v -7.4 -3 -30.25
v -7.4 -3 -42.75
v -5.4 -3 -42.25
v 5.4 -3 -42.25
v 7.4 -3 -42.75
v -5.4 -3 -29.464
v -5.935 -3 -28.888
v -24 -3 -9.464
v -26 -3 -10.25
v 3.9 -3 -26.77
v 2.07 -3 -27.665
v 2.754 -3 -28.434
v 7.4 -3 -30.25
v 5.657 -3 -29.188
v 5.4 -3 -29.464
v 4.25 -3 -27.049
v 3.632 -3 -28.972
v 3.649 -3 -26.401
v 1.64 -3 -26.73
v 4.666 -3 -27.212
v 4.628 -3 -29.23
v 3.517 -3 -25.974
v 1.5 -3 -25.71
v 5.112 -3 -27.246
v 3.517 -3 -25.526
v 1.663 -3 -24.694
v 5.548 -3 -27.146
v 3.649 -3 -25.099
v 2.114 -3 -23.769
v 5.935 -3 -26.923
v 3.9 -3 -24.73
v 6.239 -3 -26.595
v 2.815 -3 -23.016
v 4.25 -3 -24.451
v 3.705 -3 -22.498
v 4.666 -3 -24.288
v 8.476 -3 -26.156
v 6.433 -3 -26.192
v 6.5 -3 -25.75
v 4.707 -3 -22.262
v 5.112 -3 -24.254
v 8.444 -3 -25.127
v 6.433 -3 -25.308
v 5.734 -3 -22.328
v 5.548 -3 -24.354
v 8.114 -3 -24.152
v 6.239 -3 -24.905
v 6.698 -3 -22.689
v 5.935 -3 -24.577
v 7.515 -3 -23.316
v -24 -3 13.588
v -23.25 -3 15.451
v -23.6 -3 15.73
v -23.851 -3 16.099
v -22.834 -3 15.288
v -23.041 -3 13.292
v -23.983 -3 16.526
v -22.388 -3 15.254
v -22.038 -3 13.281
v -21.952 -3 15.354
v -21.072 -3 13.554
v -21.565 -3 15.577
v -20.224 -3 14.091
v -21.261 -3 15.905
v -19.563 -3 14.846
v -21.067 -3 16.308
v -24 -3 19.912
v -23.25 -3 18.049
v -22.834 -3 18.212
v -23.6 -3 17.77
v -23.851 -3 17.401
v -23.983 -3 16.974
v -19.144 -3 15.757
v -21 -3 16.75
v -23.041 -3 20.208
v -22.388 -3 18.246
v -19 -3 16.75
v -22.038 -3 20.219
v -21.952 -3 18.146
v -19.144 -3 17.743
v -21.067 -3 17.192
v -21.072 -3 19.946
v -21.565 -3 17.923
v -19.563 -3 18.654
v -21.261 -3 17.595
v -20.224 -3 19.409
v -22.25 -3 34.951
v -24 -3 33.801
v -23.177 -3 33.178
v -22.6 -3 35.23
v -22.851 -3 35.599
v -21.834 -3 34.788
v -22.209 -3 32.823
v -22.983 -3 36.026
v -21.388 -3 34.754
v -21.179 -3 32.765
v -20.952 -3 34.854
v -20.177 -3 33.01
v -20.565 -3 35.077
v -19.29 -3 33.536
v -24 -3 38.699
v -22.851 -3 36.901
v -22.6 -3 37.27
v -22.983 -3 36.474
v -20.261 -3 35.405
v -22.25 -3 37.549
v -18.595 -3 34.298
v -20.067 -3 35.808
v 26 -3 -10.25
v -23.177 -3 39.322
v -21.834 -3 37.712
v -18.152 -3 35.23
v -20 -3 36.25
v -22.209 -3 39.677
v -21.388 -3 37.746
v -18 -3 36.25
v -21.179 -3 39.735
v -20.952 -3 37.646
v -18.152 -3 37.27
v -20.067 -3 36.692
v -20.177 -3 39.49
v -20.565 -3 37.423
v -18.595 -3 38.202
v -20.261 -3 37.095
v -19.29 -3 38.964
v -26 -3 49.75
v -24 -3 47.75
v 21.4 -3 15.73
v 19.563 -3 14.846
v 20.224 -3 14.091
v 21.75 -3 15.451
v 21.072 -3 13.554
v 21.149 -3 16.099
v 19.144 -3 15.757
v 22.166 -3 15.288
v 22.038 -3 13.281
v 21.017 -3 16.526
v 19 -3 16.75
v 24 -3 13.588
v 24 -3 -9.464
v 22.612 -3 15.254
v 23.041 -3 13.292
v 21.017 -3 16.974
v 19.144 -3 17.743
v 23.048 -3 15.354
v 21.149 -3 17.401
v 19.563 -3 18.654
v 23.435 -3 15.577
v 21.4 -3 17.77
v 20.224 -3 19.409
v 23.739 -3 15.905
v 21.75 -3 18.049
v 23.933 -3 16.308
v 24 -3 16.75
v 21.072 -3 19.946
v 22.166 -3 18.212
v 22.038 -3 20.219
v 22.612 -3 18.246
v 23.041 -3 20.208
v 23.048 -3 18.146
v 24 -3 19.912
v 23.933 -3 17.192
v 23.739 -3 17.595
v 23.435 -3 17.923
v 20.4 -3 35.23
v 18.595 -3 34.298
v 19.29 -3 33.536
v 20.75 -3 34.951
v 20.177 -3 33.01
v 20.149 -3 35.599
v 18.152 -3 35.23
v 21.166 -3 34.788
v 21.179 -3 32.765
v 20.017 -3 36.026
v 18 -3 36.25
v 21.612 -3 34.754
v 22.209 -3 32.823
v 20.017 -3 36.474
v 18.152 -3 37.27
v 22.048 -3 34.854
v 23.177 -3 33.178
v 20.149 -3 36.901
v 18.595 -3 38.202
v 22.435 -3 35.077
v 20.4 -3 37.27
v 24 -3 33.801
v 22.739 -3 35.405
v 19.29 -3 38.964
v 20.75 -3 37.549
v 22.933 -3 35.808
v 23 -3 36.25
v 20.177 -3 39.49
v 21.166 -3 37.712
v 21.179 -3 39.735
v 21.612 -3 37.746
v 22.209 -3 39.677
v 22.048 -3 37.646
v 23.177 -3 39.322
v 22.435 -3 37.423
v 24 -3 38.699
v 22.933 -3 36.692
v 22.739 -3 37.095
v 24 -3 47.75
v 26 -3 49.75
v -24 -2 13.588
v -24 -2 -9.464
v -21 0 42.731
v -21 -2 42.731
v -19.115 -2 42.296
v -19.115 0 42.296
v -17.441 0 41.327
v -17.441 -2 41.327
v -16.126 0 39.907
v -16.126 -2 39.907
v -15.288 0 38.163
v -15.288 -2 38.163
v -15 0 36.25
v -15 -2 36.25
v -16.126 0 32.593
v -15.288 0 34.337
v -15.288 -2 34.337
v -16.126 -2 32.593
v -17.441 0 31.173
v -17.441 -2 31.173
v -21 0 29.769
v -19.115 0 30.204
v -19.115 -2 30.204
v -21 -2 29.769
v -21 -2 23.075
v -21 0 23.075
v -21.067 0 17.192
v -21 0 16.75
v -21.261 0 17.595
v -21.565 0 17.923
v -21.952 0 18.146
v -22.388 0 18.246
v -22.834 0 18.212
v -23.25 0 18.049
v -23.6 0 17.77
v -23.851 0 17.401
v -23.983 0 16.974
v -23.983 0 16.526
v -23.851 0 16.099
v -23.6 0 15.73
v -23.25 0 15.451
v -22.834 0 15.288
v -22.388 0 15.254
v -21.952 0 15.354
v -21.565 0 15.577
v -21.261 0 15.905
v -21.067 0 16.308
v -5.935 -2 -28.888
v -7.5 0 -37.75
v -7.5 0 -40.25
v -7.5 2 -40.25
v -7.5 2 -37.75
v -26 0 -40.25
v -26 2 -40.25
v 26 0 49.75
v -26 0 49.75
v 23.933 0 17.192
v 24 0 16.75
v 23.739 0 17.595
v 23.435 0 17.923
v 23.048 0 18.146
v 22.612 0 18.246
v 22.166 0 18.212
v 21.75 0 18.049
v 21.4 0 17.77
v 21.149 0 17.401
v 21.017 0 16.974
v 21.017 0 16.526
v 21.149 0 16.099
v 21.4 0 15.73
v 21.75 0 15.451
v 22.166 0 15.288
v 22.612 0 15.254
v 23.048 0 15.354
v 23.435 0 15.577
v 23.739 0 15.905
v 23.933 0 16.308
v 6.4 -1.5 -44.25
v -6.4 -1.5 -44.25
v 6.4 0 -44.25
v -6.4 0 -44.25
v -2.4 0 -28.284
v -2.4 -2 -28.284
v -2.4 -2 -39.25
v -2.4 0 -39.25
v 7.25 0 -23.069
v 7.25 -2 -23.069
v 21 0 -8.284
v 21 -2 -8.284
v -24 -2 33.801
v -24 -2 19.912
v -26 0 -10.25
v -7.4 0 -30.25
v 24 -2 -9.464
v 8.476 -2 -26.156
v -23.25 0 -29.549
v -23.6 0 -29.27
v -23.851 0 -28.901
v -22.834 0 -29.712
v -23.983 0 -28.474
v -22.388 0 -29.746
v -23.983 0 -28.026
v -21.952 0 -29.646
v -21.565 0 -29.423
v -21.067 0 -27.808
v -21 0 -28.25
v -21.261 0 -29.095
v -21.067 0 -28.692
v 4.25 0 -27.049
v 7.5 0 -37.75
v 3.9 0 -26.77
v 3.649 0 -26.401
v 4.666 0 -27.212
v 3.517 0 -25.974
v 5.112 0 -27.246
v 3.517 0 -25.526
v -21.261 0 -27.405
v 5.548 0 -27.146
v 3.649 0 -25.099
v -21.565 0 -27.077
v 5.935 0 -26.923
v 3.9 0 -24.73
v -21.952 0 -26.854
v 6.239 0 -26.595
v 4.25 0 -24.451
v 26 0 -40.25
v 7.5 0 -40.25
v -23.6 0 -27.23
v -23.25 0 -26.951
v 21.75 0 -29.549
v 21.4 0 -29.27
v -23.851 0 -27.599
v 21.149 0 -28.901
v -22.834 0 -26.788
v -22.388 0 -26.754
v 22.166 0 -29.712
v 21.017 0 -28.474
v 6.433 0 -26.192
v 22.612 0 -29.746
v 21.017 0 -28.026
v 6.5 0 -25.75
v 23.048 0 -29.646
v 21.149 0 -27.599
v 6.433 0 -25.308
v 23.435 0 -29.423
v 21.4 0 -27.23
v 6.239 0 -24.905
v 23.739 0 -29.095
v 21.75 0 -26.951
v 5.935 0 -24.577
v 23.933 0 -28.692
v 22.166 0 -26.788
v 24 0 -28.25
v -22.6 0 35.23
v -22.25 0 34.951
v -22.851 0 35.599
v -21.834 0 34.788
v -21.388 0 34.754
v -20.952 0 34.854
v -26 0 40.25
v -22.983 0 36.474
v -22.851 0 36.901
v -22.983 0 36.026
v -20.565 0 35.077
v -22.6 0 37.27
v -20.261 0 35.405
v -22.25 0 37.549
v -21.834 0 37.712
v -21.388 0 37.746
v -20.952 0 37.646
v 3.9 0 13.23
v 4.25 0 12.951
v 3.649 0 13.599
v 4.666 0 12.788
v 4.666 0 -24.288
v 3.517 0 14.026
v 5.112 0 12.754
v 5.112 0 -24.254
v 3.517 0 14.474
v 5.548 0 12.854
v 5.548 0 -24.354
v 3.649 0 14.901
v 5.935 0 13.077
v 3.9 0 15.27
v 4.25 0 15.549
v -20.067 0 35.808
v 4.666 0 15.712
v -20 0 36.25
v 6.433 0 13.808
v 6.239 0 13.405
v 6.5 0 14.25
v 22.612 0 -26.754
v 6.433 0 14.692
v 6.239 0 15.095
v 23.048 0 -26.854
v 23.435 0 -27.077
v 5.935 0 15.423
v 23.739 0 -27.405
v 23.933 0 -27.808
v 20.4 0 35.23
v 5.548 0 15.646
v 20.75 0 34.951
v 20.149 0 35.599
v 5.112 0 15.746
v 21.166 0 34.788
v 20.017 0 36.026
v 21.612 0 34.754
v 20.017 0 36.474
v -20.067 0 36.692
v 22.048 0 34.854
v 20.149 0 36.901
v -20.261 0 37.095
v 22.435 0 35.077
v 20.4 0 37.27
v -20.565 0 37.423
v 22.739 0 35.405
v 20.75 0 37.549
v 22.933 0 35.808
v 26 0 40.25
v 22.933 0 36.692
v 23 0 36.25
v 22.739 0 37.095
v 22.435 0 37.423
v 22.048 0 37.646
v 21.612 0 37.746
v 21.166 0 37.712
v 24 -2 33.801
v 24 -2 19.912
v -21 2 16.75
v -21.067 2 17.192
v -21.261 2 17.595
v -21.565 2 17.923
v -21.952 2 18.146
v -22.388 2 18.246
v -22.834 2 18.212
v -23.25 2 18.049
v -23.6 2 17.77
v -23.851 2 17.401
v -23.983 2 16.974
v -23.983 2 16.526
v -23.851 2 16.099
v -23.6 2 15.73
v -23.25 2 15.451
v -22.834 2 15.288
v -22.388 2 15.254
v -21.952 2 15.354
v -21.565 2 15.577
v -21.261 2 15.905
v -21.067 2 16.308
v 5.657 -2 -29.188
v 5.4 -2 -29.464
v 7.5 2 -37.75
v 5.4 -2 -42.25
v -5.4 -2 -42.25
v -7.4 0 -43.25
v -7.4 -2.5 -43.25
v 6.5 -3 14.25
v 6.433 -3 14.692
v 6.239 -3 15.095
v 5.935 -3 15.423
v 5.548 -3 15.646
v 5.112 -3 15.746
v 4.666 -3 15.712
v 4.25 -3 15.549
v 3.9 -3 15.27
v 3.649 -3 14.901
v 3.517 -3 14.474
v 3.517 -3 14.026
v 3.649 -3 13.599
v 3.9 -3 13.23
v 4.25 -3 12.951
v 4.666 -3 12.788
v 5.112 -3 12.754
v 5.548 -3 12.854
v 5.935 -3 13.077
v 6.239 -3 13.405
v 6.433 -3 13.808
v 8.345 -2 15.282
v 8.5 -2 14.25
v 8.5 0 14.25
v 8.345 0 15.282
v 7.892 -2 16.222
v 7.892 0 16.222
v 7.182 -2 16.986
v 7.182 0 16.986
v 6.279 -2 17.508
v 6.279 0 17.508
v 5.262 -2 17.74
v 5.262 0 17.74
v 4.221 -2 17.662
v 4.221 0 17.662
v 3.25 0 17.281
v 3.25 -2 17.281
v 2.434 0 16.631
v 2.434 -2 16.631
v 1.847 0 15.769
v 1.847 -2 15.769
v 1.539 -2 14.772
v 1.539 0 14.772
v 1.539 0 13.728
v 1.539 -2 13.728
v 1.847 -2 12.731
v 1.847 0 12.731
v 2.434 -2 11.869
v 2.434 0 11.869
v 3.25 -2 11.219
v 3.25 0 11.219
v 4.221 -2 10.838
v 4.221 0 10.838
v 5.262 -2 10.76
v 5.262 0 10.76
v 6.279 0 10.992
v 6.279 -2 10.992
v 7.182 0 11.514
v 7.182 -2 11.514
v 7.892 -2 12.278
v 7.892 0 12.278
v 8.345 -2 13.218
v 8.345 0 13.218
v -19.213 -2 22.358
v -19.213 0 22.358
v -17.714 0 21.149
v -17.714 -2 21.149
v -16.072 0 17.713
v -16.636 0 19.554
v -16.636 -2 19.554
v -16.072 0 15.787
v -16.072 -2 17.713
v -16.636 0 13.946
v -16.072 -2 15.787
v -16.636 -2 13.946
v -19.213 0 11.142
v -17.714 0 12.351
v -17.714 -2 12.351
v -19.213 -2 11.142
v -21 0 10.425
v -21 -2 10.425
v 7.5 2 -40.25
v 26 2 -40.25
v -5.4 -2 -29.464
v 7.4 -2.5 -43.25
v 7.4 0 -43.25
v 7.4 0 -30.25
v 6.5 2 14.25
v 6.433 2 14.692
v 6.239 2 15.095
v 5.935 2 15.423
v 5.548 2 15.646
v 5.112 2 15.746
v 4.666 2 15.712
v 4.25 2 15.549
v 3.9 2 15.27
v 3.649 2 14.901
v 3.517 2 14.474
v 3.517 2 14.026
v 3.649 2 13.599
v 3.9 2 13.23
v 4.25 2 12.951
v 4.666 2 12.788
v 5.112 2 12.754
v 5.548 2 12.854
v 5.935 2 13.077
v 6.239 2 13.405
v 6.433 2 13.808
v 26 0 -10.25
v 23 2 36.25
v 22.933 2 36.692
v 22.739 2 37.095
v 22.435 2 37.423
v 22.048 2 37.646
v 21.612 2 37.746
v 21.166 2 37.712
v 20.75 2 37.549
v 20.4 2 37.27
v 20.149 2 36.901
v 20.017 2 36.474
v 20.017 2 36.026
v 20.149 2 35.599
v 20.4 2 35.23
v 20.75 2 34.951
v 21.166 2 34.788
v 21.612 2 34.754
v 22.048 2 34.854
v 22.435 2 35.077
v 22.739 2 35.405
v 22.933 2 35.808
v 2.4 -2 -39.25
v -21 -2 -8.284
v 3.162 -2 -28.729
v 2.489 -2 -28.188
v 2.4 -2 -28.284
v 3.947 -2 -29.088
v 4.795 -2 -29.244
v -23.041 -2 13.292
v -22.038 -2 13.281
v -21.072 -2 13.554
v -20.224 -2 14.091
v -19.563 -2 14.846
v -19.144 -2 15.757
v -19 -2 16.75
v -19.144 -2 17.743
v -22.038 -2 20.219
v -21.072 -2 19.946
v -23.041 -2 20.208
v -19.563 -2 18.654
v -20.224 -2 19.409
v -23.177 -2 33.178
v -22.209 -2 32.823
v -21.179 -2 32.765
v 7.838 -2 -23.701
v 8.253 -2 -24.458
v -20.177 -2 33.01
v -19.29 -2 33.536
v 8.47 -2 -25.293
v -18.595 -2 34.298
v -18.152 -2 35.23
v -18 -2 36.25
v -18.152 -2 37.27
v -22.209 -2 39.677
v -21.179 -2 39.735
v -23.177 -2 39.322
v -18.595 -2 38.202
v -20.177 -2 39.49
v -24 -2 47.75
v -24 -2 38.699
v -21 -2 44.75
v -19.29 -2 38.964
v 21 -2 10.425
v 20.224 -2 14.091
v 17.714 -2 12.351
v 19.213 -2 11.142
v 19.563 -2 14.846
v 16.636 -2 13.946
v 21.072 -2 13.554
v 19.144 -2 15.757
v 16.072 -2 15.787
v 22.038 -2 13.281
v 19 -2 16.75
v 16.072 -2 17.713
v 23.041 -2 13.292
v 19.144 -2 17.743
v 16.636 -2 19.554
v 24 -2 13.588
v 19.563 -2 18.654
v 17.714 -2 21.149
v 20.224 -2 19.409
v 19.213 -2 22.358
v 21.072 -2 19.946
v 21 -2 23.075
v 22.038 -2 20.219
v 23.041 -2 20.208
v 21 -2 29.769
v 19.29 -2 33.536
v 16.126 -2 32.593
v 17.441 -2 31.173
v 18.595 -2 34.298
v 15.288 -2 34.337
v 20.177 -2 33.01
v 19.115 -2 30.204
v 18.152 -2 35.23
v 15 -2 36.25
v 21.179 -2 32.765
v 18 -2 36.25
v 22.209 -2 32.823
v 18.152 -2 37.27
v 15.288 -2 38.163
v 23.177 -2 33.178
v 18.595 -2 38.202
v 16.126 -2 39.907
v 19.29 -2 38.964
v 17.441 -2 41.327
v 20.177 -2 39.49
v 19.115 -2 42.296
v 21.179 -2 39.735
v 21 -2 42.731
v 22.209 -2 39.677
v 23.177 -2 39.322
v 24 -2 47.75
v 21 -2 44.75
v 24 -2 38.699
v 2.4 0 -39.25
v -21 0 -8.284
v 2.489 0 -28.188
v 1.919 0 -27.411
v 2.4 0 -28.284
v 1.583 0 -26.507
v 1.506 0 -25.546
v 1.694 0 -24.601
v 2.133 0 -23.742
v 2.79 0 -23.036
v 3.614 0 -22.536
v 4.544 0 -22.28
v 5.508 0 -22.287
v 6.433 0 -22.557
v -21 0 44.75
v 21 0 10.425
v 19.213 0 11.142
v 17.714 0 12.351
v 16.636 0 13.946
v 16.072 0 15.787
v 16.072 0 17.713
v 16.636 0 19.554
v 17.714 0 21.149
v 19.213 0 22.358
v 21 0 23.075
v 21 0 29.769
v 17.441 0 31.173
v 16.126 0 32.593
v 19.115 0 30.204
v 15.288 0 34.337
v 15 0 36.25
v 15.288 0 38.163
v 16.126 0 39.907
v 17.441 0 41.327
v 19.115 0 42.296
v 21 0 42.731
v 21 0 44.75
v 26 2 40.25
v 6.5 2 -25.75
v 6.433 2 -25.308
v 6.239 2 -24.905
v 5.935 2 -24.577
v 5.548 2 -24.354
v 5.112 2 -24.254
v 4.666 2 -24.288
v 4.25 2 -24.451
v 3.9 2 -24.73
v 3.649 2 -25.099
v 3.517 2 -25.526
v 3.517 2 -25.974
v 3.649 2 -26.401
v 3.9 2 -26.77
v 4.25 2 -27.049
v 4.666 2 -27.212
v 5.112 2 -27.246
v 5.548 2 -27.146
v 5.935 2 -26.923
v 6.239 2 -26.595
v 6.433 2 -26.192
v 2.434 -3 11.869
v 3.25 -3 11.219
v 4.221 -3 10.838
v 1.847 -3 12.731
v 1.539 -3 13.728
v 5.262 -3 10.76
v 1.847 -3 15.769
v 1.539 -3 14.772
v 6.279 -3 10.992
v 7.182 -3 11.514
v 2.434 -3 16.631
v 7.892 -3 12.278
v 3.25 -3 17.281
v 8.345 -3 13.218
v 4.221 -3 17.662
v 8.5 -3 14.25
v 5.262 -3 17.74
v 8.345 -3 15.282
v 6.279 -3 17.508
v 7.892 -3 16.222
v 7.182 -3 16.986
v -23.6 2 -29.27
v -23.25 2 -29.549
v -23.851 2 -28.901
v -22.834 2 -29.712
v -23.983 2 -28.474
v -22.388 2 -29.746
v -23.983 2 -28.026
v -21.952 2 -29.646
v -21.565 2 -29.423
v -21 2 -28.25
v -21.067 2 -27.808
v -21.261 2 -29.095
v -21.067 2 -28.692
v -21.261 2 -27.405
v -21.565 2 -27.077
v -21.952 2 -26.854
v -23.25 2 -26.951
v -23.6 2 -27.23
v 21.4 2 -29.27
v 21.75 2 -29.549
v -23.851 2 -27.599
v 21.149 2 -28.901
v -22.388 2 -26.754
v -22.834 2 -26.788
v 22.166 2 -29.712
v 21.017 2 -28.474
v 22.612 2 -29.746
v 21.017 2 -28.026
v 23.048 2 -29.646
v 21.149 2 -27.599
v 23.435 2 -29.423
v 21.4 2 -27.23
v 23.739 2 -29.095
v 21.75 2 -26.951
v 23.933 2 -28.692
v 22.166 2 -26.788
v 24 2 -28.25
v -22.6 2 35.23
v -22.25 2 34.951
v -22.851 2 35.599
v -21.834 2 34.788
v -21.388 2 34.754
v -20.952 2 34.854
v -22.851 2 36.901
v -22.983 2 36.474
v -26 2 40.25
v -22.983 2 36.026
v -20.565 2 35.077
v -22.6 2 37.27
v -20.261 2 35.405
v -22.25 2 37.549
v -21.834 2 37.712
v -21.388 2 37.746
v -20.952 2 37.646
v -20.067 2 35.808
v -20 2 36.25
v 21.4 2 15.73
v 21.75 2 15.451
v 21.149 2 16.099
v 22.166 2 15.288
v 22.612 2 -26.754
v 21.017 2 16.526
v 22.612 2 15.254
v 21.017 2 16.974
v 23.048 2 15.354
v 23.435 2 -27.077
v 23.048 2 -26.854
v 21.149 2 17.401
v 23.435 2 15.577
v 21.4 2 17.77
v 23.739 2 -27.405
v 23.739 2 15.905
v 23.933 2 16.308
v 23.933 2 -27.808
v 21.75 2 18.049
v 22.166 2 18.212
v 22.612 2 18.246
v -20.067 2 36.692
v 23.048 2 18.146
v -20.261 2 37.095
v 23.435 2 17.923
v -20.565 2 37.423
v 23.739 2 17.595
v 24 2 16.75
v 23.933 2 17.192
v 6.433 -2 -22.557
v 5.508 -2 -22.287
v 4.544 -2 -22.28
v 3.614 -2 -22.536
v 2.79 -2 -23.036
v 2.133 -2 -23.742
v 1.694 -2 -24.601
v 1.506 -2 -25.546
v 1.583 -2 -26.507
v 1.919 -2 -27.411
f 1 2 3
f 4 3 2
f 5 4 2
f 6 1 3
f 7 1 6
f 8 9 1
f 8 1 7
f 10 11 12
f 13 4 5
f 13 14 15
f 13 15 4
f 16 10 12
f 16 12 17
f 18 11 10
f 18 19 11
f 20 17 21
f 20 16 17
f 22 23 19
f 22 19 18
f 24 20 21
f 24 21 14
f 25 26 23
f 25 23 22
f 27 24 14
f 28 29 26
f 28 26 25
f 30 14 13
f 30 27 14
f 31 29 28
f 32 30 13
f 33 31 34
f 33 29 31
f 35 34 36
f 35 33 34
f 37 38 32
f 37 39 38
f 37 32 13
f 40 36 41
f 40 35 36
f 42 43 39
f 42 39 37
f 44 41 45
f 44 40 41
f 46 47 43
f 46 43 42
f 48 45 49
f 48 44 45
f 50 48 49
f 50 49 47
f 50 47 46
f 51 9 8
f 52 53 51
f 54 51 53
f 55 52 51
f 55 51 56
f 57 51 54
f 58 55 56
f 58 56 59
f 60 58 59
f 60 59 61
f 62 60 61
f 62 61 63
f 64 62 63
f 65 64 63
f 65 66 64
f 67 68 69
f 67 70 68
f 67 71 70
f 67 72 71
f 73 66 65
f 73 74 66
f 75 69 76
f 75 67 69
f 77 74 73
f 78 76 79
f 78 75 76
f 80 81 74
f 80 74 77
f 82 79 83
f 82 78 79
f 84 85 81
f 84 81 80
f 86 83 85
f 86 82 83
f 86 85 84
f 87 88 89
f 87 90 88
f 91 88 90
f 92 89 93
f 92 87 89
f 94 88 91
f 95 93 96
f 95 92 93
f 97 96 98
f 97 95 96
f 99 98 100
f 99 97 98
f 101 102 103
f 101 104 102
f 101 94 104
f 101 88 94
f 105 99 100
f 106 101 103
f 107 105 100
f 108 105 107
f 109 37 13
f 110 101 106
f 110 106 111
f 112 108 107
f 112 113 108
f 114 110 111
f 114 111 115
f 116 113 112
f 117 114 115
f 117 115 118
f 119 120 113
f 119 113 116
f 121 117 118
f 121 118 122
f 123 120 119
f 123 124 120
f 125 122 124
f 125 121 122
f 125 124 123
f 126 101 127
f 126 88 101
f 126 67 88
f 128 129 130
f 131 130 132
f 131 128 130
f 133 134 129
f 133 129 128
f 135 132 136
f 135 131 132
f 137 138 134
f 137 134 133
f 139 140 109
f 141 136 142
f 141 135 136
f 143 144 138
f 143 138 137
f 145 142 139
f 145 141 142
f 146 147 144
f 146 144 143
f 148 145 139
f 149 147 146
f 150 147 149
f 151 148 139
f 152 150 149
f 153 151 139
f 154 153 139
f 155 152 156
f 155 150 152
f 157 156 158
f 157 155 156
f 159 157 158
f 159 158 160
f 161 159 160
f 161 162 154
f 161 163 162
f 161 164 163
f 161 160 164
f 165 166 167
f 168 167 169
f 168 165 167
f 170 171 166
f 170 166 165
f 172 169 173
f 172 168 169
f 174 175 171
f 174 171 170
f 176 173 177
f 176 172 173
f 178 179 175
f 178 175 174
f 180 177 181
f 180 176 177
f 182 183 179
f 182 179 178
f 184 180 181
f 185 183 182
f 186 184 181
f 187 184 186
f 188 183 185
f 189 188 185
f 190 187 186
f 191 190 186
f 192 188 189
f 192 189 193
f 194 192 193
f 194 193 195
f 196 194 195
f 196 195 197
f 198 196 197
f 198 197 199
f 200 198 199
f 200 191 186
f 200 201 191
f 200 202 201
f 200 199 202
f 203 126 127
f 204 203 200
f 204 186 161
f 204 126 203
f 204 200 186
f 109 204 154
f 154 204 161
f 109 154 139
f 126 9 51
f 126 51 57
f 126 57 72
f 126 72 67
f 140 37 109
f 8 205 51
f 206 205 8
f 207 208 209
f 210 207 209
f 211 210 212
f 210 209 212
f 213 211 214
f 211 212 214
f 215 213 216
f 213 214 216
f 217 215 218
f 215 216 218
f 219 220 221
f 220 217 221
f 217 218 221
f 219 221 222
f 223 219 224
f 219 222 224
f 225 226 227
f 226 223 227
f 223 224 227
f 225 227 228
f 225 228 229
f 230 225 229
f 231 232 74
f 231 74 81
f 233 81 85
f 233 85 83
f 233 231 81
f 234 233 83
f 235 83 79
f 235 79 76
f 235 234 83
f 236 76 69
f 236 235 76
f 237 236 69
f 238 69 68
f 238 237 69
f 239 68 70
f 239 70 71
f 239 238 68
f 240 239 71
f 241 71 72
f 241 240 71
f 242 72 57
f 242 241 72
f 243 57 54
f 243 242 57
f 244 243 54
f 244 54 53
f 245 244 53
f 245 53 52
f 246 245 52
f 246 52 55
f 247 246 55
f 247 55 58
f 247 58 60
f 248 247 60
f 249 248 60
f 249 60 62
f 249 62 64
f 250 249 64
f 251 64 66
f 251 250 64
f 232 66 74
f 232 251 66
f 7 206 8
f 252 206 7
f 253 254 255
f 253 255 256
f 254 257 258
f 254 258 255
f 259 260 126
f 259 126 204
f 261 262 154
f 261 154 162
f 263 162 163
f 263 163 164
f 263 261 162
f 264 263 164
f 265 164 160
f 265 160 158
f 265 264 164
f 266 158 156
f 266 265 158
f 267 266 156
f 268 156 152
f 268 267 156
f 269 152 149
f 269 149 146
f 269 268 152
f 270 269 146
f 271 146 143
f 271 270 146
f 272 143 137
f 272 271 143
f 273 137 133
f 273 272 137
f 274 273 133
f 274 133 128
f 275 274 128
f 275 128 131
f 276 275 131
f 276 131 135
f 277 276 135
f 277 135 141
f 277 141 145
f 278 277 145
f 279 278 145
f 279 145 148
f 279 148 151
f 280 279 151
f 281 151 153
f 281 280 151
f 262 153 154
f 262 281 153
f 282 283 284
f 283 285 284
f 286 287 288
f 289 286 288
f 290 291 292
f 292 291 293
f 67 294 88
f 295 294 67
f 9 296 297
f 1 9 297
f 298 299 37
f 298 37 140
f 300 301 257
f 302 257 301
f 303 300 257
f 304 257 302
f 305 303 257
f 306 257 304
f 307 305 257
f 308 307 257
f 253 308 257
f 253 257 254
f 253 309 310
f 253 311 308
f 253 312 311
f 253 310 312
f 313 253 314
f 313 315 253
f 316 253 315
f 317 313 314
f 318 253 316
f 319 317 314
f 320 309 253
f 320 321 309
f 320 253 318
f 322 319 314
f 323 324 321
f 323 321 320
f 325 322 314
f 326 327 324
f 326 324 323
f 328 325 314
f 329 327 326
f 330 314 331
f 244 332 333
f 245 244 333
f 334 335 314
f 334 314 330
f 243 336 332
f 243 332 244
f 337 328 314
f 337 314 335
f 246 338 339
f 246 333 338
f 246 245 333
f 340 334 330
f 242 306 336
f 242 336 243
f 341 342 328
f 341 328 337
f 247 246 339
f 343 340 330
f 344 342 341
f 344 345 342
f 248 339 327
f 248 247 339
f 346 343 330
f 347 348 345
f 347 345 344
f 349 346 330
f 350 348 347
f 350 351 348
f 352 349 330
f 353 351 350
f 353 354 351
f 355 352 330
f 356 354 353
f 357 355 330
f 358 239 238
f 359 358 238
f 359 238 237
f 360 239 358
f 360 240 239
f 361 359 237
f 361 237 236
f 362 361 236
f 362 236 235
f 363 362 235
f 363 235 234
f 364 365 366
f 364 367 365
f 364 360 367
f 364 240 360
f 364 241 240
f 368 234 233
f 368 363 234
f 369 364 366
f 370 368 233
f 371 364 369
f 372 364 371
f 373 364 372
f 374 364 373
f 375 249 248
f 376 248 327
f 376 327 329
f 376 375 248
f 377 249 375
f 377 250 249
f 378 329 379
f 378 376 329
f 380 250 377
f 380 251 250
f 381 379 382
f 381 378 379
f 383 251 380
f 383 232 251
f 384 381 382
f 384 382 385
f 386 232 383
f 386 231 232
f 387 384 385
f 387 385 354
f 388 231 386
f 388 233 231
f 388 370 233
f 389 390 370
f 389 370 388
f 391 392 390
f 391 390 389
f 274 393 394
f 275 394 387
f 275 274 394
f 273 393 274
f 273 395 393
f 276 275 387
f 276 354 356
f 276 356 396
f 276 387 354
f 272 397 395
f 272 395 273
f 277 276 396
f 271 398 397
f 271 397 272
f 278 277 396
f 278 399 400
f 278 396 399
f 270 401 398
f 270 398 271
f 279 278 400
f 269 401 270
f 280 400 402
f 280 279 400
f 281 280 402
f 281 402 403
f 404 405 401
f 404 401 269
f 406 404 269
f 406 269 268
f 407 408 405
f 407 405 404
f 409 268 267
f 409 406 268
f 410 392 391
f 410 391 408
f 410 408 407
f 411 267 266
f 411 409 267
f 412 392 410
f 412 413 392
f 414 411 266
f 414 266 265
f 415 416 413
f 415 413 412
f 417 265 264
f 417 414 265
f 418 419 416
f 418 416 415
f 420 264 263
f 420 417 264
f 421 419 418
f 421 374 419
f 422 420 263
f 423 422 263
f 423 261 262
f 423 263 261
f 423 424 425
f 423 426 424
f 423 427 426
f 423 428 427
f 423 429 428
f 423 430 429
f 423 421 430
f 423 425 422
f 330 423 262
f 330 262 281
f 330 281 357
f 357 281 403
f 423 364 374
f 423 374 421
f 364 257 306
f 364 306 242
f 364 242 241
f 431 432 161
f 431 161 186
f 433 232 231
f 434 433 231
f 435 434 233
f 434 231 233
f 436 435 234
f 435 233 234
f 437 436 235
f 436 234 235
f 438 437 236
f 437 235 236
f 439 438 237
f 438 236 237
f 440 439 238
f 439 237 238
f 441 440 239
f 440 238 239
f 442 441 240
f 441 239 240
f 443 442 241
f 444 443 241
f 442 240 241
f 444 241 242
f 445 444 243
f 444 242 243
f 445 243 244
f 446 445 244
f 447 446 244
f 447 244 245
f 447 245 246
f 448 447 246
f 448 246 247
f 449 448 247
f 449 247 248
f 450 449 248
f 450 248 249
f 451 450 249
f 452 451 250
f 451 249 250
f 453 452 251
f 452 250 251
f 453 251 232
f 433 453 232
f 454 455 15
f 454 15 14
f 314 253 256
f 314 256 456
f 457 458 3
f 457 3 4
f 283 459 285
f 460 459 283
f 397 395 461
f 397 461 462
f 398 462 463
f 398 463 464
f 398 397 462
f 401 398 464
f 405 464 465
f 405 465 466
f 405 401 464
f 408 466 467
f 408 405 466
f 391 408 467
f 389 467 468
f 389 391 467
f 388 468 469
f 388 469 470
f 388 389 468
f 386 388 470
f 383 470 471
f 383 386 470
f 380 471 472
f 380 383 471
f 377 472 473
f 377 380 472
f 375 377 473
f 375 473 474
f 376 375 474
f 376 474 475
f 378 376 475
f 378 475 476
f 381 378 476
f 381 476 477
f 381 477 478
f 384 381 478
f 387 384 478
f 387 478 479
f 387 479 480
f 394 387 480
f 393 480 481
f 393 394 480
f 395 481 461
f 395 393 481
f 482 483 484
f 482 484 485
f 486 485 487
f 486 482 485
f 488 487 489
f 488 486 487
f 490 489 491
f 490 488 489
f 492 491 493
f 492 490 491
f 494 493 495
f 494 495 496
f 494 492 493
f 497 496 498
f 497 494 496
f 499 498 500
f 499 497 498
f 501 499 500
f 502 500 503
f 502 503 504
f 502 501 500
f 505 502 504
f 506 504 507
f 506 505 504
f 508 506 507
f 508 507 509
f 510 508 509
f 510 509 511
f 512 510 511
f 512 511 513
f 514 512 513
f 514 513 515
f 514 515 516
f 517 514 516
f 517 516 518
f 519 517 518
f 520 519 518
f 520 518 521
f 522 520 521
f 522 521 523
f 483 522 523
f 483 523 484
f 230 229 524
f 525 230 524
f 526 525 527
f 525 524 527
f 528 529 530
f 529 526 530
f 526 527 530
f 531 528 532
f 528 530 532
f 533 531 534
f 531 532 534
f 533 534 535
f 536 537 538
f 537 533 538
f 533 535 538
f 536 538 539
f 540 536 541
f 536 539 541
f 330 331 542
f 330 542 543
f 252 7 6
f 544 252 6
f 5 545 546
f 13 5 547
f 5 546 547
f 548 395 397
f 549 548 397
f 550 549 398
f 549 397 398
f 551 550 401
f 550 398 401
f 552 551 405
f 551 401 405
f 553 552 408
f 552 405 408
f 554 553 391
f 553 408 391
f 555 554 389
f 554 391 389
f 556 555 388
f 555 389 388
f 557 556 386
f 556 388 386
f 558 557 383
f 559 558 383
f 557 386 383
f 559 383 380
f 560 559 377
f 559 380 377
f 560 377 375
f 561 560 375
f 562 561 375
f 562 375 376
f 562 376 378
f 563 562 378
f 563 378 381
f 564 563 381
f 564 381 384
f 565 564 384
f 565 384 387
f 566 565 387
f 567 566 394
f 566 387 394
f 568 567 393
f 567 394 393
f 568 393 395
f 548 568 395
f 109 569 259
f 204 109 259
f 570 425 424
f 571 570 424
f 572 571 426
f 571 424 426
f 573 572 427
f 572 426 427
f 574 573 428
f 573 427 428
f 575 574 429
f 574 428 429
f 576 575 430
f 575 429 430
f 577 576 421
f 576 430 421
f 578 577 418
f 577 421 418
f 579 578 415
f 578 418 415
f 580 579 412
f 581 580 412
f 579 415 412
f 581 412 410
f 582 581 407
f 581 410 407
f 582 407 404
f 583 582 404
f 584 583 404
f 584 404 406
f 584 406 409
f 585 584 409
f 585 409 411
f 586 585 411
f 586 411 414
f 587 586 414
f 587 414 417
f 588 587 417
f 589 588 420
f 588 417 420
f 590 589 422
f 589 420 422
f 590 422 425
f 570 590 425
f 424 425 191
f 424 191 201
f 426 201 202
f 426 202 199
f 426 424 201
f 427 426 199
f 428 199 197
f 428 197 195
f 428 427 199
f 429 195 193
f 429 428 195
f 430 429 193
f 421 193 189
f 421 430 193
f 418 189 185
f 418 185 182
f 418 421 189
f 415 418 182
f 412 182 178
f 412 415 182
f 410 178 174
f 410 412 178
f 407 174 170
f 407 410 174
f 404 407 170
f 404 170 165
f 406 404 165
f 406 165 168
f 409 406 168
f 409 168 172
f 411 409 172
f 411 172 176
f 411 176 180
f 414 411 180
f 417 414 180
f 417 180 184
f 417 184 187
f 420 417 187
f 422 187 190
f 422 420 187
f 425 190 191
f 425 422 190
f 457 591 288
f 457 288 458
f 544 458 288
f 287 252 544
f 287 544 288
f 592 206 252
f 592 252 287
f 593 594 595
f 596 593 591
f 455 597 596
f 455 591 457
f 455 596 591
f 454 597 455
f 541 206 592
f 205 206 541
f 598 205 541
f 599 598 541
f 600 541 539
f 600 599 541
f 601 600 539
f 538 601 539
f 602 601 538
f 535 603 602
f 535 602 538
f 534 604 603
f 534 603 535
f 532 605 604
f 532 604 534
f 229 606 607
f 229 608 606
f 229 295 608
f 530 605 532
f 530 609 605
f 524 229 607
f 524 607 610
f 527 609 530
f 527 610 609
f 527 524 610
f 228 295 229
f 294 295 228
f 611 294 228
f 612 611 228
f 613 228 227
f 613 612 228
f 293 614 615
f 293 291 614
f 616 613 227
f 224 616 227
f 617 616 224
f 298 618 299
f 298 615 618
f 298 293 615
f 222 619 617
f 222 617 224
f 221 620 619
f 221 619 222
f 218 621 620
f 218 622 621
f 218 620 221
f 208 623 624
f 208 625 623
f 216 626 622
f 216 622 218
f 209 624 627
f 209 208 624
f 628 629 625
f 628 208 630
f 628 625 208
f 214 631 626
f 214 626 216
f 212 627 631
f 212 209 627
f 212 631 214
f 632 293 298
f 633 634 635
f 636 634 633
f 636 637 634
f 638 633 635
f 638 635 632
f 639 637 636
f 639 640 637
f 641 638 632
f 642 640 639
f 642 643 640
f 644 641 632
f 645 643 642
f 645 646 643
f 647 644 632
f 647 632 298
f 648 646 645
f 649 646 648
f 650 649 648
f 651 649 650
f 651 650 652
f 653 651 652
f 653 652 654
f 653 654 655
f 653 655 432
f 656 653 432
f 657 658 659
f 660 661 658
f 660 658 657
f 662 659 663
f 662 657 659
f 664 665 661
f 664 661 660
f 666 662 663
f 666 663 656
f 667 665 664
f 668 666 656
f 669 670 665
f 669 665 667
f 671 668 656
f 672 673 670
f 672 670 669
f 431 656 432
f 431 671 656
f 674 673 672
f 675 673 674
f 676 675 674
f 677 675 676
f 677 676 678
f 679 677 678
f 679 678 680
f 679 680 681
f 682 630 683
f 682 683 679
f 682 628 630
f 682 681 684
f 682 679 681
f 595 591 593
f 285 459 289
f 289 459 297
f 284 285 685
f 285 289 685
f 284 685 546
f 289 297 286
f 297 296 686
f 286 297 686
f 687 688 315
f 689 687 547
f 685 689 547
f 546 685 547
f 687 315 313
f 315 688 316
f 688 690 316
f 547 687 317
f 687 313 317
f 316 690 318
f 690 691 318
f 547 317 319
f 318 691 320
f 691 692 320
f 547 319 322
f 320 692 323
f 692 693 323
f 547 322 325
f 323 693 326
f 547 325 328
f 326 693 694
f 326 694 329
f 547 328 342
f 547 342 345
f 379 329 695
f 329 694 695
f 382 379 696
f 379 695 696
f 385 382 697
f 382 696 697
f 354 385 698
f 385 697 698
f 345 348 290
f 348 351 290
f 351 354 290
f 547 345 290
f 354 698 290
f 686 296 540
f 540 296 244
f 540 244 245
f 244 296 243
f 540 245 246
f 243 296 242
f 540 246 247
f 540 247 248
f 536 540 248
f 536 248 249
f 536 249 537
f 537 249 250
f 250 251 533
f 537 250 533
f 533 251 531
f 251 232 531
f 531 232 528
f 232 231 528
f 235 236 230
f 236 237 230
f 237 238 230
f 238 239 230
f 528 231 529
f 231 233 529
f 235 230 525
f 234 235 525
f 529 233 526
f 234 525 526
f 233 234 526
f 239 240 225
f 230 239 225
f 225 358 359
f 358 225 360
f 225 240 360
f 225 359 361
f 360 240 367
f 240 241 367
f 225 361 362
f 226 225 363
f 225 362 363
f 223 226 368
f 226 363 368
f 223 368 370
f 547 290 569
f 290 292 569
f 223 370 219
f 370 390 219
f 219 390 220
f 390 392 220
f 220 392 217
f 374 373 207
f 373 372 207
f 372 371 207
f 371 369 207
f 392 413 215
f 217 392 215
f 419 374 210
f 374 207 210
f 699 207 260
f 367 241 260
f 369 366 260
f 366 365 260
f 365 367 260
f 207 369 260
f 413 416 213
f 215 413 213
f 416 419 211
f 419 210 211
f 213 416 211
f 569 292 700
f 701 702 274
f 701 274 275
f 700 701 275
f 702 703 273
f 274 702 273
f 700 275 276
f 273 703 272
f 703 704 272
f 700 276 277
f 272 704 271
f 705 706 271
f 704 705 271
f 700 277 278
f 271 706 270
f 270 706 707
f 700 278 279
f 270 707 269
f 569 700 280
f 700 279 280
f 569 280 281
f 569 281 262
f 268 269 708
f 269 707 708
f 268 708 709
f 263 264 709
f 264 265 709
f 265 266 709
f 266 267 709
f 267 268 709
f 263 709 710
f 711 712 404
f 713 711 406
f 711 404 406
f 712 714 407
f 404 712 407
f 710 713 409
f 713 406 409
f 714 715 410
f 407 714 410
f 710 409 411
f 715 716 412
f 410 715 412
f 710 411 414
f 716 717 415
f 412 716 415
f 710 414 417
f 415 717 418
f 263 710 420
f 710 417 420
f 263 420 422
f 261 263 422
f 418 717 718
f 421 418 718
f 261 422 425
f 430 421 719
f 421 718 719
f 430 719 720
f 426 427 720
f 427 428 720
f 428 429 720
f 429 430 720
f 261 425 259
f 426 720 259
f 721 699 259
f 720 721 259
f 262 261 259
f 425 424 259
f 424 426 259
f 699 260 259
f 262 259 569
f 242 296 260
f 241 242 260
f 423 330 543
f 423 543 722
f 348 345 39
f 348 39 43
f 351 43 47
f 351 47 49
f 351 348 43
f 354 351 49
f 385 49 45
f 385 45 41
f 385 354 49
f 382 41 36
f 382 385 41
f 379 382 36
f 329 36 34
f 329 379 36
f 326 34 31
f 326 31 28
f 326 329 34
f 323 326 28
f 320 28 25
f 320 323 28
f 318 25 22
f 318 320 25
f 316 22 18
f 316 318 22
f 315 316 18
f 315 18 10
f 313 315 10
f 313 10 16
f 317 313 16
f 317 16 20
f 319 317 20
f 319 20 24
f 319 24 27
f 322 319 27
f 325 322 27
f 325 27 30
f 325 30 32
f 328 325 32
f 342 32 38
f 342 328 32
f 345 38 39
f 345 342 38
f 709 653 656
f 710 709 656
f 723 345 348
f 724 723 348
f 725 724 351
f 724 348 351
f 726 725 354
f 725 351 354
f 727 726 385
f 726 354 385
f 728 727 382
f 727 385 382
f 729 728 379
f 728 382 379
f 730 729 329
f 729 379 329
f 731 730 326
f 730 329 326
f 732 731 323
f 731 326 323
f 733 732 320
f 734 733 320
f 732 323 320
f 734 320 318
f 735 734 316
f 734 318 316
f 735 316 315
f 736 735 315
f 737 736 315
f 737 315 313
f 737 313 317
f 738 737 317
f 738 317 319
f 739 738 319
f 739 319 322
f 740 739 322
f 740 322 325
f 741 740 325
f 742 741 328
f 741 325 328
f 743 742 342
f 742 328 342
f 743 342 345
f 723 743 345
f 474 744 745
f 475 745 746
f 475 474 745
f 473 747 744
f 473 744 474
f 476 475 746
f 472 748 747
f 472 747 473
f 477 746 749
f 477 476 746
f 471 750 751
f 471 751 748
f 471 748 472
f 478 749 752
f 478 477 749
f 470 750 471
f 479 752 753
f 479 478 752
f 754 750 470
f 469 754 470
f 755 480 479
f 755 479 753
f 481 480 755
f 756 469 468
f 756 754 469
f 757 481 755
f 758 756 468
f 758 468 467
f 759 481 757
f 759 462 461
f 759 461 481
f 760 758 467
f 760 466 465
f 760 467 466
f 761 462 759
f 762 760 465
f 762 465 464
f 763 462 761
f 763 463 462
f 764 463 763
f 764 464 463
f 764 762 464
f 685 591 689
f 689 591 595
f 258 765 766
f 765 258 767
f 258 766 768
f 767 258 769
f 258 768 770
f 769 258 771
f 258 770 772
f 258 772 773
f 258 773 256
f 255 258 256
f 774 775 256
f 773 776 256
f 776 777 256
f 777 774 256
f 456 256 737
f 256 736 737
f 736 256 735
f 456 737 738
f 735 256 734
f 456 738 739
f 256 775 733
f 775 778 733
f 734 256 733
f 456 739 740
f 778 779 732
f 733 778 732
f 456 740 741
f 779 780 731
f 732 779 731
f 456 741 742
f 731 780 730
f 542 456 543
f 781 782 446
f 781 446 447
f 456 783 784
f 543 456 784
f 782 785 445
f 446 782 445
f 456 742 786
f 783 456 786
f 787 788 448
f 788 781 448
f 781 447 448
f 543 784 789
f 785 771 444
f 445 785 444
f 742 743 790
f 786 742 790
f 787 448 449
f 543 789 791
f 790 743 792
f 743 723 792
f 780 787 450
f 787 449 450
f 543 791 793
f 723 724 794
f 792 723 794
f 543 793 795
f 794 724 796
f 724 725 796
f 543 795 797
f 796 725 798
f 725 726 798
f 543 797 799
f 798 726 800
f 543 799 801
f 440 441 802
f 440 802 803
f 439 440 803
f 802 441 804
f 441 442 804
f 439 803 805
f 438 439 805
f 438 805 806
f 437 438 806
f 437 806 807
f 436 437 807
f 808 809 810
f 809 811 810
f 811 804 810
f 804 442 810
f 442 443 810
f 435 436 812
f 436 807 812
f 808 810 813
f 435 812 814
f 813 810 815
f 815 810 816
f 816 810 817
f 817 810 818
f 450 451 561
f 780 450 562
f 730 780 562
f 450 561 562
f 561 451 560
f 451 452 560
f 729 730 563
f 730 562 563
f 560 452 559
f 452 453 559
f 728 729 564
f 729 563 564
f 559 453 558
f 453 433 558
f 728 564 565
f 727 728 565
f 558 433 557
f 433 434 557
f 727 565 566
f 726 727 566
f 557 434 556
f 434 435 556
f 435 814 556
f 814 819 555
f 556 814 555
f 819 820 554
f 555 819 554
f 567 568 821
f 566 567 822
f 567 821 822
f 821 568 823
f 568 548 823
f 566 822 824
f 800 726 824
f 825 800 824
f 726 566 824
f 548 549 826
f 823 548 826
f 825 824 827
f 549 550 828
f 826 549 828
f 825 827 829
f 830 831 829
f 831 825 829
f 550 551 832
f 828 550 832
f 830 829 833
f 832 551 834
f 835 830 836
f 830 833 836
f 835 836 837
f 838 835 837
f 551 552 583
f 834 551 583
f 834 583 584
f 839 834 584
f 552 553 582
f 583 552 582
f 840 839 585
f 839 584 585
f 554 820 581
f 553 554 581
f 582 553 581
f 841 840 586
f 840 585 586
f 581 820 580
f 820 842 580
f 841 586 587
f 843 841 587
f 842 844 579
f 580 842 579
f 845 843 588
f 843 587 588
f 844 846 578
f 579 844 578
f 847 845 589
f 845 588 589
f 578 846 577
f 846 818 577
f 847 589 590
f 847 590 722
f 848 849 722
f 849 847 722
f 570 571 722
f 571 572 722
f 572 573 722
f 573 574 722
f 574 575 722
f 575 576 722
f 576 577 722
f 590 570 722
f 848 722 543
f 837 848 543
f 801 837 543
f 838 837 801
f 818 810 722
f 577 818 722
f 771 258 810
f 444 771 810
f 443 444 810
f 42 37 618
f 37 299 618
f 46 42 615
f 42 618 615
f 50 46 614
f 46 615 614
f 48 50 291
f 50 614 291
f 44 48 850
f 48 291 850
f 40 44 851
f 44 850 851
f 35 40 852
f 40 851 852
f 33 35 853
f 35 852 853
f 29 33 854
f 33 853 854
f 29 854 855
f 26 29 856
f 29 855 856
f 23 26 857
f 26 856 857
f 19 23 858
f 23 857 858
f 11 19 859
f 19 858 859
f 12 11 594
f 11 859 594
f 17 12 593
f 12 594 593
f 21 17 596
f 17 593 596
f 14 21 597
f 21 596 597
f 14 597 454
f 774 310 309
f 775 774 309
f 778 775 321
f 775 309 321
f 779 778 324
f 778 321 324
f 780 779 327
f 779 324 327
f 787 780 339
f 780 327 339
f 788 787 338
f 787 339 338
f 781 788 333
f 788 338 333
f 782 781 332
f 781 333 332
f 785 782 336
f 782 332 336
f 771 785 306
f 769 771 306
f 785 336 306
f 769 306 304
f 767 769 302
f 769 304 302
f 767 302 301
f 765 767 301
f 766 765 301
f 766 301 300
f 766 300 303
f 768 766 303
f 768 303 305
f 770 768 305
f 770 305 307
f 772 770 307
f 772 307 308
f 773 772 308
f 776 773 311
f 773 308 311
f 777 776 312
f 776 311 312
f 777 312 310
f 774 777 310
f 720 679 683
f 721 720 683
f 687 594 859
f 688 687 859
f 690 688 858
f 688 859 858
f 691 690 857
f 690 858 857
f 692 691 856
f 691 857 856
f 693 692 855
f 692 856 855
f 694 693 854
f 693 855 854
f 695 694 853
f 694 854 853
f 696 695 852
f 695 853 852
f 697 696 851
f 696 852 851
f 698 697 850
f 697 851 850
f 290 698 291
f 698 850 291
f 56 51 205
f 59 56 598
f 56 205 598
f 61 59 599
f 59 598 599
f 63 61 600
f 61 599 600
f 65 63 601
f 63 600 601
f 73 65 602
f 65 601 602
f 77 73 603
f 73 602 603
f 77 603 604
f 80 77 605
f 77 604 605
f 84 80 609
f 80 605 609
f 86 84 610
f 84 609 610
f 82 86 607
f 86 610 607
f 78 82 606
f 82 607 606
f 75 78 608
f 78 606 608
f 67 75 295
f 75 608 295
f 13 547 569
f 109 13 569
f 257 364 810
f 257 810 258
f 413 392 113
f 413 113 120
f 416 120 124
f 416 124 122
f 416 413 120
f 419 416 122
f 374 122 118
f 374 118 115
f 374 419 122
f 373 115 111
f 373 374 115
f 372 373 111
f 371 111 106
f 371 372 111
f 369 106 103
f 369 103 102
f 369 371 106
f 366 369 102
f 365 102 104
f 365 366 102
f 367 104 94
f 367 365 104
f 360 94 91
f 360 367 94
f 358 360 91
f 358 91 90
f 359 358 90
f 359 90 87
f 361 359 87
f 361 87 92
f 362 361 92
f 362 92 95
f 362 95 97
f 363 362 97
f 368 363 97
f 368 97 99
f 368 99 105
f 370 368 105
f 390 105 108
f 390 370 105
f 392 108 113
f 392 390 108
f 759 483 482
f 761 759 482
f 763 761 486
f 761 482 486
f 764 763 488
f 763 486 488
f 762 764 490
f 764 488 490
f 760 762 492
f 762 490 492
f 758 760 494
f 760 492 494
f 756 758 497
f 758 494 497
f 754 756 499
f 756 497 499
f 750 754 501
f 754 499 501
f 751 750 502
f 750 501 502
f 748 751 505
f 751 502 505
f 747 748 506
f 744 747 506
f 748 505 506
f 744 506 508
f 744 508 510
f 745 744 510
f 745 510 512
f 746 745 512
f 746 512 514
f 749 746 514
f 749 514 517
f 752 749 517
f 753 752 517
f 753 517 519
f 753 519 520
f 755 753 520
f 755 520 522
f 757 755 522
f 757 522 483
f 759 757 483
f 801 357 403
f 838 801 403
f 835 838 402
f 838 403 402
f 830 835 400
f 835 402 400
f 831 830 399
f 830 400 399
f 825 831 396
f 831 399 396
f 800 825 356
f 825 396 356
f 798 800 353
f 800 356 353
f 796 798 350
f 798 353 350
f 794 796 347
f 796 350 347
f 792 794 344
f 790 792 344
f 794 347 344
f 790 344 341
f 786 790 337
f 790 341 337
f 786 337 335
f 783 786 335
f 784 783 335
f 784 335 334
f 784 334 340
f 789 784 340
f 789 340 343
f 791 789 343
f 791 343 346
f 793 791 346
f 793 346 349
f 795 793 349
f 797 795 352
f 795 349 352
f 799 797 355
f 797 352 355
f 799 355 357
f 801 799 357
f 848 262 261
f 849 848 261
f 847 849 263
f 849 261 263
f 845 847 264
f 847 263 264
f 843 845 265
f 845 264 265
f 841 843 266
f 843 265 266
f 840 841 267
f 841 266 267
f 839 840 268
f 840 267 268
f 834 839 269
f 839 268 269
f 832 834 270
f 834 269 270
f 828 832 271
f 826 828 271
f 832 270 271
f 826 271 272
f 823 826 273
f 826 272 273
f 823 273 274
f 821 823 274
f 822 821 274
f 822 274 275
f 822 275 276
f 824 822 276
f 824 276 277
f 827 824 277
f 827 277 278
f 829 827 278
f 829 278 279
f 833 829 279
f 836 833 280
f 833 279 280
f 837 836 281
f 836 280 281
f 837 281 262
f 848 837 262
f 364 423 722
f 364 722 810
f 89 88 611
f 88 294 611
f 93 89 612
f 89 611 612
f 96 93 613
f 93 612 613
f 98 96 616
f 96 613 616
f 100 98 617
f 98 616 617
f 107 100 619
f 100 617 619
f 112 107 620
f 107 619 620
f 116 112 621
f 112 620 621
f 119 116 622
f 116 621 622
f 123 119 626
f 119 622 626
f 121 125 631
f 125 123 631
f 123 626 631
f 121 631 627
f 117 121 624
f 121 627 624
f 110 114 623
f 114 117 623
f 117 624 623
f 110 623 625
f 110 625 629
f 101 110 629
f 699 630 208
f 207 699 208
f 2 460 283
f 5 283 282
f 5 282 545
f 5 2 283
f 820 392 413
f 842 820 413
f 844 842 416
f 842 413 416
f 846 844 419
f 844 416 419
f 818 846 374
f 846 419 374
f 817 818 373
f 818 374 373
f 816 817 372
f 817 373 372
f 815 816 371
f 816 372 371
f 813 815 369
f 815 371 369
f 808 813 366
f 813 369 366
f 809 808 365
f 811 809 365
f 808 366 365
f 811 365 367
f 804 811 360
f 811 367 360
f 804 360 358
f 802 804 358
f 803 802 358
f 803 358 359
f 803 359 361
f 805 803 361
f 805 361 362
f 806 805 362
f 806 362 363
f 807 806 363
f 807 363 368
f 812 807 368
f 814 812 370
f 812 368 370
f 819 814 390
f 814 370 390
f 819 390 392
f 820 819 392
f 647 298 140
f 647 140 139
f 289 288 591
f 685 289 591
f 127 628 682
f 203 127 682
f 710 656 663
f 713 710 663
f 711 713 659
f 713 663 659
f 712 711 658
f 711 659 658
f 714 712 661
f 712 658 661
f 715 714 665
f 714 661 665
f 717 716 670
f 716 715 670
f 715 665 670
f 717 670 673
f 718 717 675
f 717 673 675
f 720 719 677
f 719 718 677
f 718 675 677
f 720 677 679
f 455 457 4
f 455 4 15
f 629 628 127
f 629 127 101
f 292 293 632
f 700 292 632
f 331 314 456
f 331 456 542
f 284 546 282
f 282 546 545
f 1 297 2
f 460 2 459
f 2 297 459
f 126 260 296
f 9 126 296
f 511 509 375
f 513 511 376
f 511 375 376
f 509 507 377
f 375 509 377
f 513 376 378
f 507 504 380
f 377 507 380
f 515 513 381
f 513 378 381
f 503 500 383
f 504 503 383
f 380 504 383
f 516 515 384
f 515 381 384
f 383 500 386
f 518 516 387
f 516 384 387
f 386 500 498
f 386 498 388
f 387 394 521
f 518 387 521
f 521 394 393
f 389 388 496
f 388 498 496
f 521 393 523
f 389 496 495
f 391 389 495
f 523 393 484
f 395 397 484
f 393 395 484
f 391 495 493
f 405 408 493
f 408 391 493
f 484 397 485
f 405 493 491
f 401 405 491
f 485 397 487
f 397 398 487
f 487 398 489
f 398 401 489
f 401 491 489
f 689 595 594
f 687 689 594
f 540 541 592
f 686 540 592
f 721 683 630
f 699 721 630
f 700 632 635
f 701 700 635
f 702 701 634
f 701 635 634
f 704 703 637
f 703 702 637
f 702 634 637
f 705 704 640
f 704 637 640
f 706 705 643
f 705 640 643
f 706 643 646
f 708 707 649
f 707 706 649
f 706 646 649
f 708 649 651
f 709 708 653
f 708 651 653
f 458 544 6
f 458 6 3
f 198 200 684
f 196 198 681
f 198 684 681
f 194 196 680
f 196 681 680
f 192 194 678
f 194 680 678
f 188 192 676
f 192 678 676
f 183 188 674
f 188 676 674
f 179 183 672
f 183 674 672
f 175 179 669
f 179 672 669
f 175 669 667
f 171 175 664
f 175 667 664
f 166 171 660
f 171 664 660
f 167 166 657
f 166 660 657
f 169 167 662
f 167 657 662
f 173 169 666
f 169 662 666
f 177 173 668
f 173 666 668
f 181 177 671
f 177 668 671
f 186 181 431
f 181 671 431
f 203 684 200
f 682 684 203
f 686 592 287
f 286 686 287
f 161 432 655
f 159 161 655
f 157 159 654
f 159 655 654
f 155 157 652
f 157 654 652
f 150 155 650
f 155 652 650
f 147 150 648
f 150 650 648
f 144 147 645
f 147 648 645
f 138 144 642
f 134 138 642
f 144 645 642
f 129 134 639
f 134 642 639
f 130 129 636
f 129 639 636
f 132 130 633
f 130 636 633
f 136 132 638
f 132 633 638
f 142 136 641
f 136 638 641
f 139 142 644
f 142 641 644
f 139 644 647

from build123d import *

# Parameters (mm, degrees)
F0_R        = 1.5
F1_DEPTH    = 2
F2_W        = 52
F2_H        = 9.5
F2_R        = 1.5
F2_W_2      = 14.8
F2_H_2      = 2.5
F3_DEPTH    = 3
F4_T        = 2
F4_T3_DEPTH = 7
F5_SIZE     = 1.5
F6_SIZE     = 1
F7_R        = 3.5
F8_DEPTH    = 25


# Not quite as in the source:
# - a shell that OpenCascade refuses in one call is made with other operations: the cavity is built on its own and cut out


with BuildPart() as f1:
    # F0 (on Front) → F1 (new body)
    with BuildSketch(Plane.XZ):
        Polygon((26, -40.25), (26, 40.25), (-26, 40.25), (-26, -40.25), (-7.5, -40.25), (-7.5, -37.75), (7.5, -37.75), (7.5, -40.25), align=None)
        with Locations((-22.5, -28.25)):
            Circle(F0_R, mode=Mode.SUBTRACT)
        with Locations((5, -25.75)):
            Circle(F0_R, mode=Mode.SUBTRACT)
        with Locations((22.5, -28.25)):
            Circle(F0_R, mode=Mode.SUBTRACT)
        with Locations((-22.5, 16.75)):
            Circle(F0_R, mode=Mode.SUBTRACT)
        with Locations((-21.5, 36.25)):
            Circle(F0_R, mode=Mode.SUBTRACT)
        with Locations((5, 14.25)):
            Circle(F0_R, mode=Mode.SUBTRACT)
        with Locations((22.5, 16.75)):
            Circle(F0_R, mode=Mode.SUBTRACT)
        with Locations((21.5, 36.25)):
            Circle(F0_R, mode=Mode.SUBTRACT)
    extrude(amount=-F1_DEPTH)


with BuildPart() as f3:
    # F2 (on face) → F3 (new body)
    with BuildSketch(Plane.XZ):
        Polygon((7.4, -40.25), (-7.4, -40.25), (-7.4, -44.25), (0, -44.25), (7.4, -44.25), align=None)
        with Locations((0, 45)):
            Rectangle(F2_W, F2_H)
        Polygon((-26, 40.25), (-26, -10.25), (-7.4, -30.25), (-7.4, -37.75), (7.4, -37.75), (7.4, -30.25), (26, -10.25), (26, 40.25), align=None)
        with Locations((5, -25.75)):
            Circle(F2_R, mode=Mode.SUBTRACT)
        with Locations((-22.5, 16.75)):
            Circle(F2_R, mode=Mode.SUBTRACT)
        with Locations((-21.5, 36.25)):
            Circle(F2_R, mode=Mode.SUBTRACT)
        with Locations((5, 14.25)):
            Circle(F2_R, mode=Mode.SUBTRACT)
        with Locations((22.5, 16.75)):
            Circle(F2_R, mode=Mode.SUBTRACT)
        with Locations((21.5, 36.25)):
            Circle(F2_R, mode=Mode.SUBTRACT)
        with Locations((0, -39)):
            Rectangle(F2_W_2, F2_H_2)
    extrude(amount=F3_DEPTH)

    # F4: shell of thickness 2, made by hand


with BuildPart() as f4_core1:
    # F4_t2: copy of F3
    add(f3.part)

    # the walls: a layer under each face that stays
    f4_faces = [f4_core1.faces().sort_by_distance(p)[0] for p in [
        (0, -1.5, -44.25),
        (7.4, -1.5, -37.25),
        (16.7, -1.5, -20.25),
        (26, -1.5, 19.75),
        (0, -1.5, 49.75),
        (-26, -1.5, 19.75),
        (-16.7, -1.5, -20.25),
        (-7.4, -1.5, -37.25),
        (21, -1.5, 16.75),
        (20, -1.5, 36.25),
        (3.5, -1.5, -25.75),
        (-24, -1.5, 16.75),
        (-23, -1.5, 36.25),
        (3.5, -1.5, 14.25),
        (0, 0, 2.75),
    ]]
    thicken(f4_faces, amount=-F4_T, mode=Mode.SUBTRACT)

    # F4_s4 → F4_t3 (cut)
    with BuildSketch(Plane.XZ.offset(-2)):
        Polygon((7.4346454332, -30.2636202528), (5.4, -30.25), (5.4, -29.4637345908), (5.9354566837, -28.8879747158), align=None)
        Polygon((-7.4346454332, -30.2636202528), (-5.9354566837, -28.8879747158), (-5.4, -29.4637345908), (-5.4, -30.25), align=None)
    extrude(amount=F4_T3_DEPTH, mode=Mode.SUBTRACT)


with BuildPart() as f3_1:
    add(f3.part)

    # what is left inside the walls is the cavity
    f4_cavity = [f4_core1.part.solids().sort_by_distance(p)[0] for p in [
        (0, -2.98, -12.25),
    ]]
    add(f4_cavity, mode=Mode.SUBTRACT)

    # F5
    f5_edges = [f3_1.edges().sort_by_distance(p)[0] for p in [
        (0, -3, -44.25),
    ]]
    chamfer(f5_edges, length=F5_SIZE)

    # F6
    f6_edges = [f3_1.edges().sort_by_distance(p)[0] for p in [
        (-7.4, -0.75, -44.25),
        (7.4, -0.75, -44.25),
    ]]
    chamfer(f6_edges, length=F6_SIZE)

    # F7 (on face) → F8 (cut)
    with BuildSketch(Plane.XZ.offset(2)):
        with BuildLine():
            Line((21, -8.284336477), (21, 10.4254446797))
            ThreePointArc((21, 10.4254446797), (16, 16.75), (21, 23.0745553203))
            Line((21, 23.0745553203), (21, 29.7692593016))
            ThreePointArc((21, 29.7692593016), (15, 36.25), (21, 42.7307406984))
            Line((21, 42.7307406984), (21, 44.75))
            Line((21, 44.75), (-21, 44.75))
            Line((-21, 44.75), (-21, 42.7307406984))
            ThreePointArc((-21, 42.7307406984), (-15, 36.25), (-21, 29.7692593016))
            Line((-21, 29.7692593016), (-21, 23.0745553203))
            ThreePointArc((-21, 23.0745553203), (-16, 16.75), (-21, 10.4254446797))
            Line((-21, 10.4254446797), (-21, -8.284336477))
            Line((-21, -8.284336477), (-2.4, -28.284336477))
            Line((-2.4, -28.284336477), (-2.4, -39.25))
            Line((-2.4, -39.25), (2.4, -39.25))
            Line((2.4, -39.25), (2.4, -28.284336477))
            Line((2.4, -28.284336477), (2.489202038, -28.1884203071))
            ThreePointArc((2.489202038, -28.1884203071), (2.4370491965, -23.3664557527), (7.2501222406, -23.069151272))
            Line((7.2501222406, -23.069151272), (21, -8.284336477))
        make_face()
        with Locations((5, 14.25)):
            Circle(F7_R, mode=Mode.SUBTRACT)
    extrude(amount=-F8_DEPTH, mode=Mode.SUBTRACT)


solid = Compound([f1.part, f3_1.part])
